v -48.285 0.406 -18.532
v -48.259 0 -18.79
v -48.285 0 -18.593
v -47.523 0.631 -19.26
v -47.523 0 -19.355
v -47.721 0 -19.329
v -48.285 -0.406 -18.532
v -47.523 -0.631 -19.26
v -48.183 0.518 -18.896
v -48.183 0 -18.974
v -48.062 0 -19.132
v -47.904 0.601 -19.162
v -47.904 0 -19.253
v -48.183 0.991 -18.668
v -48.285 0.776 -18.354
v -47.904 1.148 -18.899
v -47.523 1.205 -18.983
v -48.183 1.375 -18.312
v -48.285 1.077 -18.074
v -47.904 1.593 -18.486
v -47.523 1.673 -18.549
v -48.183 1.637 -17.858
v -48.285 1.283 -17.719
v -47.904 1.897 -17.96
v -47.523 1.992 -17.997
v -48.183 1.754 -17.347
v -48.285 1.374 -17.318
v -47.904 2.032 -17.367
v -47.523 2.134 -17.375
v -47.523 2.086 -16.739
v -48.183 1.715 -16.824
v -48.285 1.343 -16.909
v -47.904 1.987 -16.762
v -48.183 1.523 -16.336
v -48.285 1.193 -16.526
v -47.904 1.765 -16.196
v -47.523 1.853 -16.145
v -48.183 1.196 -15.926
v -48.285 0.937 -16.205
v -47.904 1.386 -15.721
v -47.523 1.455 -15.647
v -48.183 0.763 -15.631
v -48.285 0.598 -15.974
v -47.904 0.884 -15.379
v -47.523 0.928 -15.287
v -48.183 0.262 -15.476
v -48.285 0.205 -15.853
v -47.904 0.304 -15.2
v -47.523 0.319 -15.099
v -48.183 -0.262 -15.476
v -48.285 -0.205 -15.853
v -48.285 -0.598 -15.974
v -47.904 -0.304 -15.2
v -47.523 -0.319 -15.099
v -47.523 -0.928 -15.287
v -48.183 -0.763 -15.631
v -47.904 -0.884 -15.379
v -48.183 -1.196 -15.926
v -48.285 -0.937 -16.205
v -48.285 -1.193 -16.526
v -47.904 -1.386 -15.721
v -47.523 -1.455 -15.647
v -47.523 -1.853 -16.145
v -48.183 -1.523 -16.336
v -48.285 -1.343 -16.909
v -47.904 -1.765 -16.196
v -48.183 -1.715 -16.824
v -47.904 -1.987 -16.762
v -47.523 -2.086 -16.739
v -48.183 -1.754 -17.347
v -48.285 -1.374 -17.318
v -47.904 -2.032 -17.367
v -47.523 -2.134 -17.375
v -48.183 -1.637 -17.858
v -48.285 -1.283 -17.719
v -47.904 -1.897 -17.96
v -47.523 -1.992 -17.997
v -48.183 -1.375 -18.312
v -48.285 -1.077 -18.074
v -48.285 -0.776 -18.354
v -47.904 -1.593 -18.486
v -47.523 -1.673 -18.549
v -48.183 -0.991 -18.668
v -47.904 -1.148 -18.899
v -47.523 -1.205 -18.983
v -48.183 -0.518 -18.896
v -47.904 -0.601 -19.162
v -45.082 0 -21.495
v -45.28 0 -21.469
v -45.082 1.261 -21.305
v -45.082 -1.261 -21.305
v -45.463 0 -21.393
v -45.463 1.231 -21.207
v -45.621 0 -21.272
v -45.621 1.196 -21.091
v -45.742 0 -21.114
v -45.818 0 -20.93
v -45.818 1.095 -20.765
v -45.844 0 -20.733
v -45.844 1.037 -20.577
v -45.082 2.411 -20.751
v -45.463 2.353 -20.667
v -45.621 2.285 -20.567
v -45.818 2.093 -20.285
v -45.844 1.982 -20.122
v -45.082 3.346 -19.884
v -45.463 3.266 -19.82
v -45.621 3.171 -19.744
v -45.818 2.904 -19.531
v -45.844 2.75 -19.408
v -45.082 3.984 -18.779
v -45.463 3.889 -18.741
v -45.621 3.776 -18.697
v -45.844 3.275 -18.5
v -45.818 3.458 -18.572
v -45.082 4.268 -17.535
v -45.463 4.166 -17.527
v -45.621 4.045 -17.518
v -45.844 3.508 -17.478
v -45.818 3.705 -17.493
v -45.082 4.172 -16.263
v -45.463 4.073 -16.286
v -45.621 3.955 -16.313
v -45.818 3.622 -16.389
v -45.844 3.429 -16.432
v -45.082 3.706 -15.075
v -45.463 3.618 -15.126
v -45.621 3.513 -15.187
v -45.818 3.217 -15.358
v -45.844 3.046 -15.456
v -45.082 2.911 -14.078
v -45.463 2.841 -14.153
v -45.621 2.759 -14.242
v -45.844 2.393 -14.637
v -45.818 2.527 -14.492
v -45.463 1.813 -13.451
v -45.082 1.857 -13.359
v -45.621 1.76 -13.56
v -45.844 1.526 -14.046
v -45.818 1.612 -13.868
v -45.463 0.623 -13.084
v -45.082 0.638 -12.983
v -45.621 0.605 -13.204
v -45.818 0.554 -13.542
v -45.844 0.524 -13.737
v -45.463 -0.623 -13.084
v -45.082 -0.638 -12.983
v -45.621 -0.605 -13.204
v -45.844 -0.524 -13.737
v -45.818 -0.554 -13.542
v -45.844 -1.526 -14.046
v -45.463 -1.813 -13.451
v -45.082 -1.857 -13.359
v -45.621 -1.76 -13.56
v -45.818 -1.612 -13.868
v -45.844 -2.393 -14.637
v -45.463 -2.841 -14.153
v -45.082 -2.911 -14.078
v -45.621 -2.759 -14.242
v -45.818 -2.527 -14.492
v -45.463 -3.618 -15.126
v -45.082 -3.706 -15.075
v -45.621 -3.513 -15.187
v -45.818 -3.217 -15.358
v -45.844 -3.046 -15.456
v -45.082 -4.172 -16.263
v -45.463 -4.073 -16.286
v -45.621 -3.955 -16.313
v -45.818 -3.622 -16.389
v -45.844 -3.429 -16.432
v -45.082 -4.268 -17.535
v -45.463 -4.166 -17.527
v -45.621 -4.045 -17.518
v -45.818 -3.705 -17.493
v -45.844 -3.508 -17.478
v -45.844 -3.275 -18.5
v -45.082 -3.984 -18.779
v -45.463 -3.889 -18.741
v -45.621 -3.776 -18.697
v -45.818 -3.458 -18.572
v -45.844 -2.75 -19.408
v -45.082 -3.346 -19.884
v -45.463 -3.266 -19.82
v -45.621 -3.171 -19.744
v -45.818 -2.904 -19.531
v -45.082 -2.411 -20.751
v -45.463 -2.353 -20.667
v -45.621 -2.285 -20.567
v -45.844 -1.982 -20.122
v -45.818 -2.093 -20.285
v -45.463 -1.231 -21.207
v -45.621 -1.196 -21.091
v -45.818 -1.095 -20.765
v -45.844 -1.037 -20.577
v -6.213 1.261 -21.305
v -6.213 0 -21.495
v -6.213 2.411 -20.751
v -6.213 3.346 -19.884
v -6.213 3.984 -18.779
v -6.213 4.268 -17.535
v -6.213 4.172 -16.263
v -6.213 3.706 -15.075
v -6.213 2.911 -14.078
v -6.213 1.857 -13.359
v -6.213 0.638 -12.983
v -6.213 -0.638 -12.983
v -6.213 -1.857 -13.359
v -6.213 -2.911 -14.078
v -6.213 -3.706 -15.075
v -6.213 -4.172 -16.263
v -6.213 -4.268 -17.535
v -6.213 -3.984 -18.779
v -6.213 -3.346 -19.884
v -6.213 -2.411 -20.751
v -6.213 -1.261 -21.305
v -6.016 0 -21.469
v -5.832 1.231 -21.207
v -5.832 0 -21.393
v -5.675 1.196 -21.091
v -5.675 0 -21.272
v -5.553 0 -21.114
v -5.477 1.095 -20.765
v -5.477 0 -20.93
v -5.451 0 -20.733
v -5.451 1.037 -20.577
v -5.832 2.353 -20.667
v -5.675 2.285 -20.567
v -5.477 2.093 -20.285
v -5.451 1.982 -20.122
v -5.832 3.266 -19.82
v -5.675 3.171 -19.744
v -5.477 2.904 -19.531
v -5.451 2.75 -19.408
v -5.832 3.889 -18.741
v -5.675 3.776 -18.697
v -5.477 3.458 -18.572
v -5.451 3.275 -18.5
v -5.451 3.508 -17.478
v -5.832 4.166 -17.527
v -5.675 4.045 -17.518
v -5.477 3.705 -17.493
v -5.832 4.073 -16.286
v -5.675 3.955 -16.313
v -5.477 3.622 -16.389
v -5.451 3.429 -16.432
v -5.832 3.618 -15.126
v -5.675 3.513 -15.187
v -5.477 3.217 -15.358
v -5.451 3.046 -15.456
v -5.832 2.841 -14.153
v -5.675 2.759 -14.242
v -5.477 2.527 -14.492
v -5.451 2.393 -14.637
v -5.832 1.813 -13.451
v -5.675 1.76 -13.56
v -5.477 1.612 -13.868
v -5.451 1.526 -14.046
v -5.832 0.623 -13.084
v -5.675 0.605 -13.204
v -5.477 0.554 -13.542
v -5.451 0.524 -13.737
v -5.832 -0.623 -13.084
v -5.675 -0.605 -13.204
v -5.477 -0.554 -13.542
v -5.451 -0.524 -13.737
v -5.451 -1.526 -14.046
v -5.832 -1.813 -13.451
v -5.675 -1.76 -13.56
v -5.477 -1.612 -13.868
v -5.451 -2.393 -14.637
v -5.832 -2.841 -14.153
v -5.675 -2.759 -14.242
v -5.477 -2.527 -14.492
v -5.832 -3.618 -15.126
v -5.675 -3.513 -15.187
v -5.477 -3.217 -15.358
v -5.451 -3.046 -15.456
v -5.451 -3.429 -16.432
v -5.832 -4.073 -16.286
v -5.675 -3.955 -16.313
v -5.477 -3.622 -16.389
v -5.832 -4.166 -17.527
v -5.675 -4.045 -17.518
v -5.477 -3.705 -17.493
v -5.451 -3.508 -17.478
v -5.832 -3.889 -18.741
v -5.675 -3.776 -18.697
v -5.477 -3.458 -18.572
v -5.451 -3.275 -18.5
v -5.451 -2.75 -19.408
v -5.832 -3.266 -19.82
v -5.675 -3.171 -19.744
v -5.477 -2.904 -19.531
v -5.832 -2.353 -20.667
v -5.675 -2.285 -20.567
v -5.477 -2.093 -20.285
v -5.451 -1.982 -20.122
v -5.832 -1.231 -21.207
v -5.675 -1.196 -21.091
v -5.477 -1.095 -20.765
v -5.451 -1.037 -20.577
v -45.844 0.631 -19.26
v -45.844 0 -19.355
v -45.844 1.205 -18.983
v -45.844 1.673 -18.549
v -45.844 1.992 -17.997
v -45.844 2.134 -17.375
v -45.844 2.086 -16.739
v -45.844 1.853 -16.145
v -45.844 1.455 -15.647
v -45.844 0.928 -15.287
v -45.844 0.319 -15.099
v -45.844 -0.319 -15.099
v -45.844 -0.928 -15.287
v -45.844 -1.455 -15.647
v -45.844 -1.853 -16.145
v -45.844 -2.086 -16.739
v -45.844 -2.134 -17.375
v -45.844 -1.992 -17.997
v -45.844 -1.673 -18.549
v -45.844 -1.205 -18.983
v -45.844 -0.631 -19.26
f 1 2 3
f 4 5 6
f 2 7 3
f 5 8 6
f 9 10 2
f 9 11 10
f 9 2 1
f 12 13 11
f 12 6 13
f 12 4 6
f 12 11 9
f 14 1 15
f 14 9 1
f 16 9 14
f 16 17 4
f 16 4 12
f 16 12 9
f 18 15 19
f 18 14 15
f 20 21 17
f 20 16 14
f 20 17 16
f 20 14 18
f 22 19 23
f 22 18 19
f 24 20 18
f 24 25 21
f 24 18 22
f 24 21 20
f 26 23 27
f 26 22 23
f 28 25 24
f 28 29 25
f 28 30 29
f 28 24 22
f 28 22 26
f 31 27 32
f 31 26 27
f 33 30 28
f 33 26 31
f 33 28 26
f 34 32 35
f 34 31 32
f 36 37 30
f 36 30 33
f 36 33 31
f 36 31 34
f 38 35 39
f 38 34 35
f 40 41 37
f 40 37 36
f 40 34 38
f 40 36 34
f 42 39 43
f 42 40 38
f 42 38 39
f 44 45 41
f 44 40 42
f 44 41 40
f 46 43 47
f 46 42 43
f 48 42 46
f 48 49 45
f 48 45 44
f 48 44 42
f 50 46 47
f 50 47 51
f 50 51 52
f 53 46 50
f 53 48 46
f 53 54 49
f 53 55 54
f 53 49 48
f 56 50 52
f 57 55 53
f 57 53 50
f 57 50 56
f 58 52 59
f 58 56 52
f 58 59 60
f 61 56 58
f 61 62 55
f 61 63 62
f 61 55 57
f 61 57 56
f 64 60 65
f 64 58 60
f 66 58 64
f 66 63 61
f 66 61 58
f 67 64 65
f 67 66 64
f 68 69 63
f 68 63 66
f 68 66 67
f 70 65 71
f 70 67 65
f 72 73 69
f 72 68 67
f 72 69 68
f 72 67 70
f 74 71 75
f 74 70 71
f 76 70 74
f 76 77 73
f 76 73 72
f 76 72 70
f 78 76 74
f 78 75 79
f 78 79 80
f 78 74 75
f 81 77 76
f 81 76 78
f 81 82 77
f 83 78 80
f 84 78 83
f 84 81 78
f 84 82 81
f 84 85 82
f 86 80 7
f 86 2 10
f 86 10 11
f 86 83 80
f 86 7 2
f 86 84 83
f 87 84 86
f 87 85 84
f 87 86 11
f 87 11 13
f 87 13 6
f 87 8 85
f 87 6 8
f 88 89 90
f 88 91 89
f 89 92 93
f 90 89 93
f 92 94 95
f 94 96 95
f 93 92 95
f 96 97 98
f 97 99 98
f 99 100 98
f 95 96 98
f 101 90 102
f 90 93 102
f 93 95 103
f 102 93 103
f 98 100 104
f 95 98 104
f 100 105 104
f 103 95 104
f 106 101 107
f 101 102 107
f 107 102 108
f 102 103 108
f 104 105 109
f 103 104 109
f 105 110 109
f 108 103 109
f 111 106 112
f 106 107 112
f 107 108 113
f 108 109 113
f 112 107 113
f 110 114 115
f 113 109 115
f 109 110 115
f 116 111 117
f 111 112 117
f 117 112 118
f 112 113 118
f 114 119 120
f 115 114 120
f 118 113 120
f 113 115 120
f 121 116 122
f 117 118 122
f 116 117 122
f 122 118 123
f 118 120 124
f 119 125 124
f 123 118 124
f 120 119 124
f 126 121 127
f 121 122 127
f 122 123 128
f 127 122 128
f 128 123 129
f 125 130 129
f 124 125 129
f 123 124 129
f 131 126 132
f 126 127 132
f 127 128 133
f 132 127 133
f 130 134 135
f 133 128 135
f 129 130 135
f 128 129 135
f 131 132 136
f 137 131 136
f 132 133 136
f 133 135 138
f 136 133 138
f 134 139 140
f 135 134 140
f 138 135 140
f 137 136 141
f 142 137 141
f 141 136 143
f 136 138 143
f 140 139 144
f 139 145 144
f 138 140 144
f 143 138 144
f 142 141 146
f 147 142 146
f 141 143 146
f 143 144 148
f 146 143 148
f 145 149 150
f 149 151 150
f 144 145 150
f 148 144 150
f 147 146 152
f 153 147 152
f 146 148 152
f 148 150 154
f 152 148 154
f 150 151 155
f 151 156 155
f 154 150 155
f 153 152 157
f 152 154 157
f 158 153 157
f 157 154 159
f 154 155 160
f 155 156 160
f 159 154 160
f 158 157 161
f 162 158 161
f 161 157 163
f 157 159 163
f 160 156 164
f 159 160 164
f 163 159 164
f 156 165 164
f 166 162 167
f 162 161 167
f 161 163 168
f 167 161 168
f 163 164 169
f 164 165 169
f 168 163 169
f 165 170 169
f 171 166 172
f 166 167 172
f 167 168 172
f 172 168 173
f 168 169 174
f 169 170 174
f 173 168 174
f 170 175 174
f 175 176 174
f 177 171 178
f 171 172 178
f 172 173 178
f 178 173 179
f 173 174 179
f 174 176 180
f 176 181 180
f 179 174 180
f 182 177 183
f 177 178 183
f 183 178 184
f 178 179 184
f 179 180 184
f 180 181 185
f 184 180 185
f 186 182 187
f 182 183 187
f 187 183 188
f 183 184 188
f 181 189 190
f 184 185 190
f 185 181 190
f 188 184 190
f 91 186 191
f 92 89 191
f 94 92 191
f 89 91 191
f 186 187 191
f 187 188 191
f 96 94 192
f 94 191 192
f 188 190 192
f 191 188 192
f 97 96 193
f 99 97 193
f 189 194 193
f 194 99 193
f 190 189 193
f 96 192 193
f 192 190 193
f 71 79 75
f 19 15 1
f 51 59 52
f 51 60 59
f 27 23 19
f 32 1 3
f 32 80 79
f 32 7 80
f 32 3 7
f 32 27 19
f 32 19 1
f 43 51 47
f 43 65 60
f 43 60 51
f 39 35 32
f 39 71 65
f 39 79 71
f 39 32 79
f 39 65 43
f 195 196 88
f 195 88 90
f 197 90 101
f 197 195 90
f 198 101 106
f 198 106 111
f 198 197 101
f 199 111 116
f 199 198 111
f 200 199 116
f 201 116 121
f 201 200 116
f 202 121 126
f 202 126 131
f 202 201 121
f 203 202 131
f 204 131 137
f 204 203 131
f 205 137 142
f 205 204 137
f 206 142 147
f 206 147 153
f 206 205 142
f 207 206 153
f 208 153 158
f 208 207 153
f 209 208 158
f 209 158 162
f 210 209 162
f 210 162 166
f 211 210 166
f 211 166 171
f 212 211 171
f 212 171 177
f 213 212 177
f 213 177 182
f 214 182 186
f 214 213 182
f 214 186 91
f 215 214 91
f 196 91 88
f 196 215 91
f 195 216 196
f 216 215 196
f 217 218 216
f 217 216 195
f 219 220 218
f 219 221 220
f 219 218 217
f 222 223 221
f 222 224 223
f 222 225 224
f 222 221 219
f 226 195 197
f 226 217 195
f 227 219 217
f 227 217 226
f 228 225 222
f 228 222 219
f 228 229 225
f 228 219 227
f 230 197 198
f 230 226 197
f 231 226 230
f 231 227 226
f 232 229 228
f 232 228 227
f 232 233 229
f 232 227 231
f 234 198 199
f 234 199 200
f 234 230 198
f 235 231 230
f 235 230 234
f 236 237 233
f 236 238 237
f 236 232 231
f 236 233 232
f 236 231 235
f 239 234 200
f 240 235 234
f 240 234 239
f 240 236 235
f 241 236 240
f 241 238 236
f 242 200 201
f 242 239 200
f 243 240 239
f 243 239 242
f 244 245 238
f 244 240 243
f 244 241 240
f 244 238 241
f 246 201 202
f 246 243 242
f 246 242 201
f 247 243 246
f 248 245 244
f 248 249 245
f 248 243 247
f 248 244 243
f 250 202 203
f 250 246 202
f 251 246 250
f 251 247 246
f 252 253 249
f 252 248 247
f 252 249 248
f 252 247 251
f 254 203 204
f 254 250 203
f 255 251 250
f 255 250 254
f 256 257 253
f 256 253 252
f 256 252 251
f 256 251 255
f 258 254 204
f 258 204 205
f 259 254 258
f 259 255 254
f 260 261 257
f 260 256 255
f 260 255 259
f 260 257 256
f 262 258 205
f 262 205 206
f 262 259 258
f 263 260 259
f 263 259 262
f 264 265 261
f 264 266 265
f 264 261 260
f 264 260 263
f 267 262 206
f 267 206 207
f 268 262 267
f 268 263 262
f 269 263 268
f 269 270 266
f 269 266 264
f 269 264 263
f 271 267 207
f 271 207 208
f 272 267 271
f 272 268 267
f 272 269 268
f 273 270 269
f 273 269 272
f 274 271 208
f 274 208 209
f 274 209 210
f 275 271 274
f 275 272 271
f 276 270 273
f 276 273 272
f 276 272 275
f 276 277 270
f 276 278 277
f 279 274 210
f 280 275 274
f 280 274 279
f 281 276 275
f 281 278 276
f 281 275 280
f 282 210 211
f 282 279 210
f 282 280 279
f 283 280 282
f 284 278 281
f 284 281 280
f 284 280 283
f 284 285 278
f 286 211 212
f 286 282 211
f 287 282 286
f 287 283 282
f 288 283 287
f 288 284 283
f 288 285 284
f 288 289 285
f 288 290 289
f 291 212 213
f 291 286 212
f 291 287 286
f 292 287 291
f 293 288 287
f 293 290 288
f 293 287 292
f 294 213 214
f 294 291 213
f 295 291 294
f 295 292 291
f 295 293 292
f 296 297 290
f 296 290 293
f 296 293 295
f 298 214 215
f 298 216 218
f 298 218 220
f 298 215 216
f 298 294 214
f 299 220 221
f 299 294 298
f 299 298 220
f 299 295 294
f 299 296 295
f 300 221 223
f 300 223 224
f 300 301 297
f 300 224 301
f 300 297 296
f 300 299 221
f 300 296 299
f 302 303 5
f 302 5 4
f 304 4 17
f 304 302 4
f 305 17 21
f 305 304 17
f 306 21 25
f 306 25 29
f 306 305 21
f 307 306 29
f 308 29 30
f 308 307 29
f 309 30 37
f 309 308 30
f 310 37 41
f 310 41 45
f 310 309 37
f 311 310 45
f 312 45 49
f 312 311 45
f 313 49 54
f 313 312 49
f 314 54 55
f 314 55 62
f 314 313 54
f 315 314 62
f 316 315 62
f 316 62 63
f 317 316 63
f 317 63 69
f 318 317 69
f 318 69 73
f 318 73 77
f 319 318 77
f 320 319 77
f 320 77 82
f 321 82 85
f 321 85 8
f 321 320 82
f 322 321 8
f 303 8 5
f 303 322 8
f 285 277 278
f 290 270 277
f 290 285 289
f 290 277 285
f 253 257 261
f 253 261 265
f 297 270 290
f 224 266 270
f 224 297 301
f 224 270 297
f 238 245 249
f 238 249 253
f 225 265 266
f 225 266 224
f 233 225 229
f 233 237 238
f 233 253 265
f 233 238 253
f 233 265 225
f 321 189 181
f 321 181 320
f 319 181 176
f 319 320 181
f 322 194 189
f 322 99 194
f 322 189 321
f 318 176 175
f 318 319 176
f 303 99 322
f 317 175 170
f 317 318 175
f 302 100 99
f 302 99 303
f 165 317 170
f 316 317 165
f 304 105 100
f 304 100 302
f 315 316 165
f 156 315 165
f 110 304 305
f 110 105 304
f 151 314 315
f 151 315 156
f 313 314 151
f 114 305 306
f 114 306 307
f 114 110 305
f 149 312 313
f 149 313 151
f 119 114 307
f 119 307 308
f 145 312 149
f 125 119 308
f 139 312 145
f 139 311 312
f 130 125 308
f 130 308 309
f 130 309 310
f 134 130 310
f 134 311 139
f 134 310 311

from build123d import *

# Parameters (mm, degrees)
FILLET2_R = 0.762


with BuildPart() as part:
    # Sketch1 → Revolve1 (revolve)
    with BuildSketch(Plane(origin=(0, 0, 0), x_dir=(1, 0, 0), z_dir=(0, 1, 0))):
        Polygon((-45.844442062, 21.494886281), (-5.451340986, 21.494886281), (-5.451340986, 17.215205983), (-45.844442062, 17.215205983), (-48.285381023, 17.215205983), (-48.285381023, 19.355046132), (-45.844442062, 19.355046132), align=None)
    revolve(axis=Axis((-45.844442062, 0, -17.215205983), (1, 0, 0)))

    # Fillet2
    fillet2_edges = [part.edges().sort_by_distance(p)[0] for p in [
        (-48.285381023, 0, -15.075365834),
        (-5.451340986, 0, -12.935525685),
        (-45.844442062, 0, -12.935525685),
    ]]
    fillet(fillet2_edges, radius=FILLET2_R)


solid = part.part
